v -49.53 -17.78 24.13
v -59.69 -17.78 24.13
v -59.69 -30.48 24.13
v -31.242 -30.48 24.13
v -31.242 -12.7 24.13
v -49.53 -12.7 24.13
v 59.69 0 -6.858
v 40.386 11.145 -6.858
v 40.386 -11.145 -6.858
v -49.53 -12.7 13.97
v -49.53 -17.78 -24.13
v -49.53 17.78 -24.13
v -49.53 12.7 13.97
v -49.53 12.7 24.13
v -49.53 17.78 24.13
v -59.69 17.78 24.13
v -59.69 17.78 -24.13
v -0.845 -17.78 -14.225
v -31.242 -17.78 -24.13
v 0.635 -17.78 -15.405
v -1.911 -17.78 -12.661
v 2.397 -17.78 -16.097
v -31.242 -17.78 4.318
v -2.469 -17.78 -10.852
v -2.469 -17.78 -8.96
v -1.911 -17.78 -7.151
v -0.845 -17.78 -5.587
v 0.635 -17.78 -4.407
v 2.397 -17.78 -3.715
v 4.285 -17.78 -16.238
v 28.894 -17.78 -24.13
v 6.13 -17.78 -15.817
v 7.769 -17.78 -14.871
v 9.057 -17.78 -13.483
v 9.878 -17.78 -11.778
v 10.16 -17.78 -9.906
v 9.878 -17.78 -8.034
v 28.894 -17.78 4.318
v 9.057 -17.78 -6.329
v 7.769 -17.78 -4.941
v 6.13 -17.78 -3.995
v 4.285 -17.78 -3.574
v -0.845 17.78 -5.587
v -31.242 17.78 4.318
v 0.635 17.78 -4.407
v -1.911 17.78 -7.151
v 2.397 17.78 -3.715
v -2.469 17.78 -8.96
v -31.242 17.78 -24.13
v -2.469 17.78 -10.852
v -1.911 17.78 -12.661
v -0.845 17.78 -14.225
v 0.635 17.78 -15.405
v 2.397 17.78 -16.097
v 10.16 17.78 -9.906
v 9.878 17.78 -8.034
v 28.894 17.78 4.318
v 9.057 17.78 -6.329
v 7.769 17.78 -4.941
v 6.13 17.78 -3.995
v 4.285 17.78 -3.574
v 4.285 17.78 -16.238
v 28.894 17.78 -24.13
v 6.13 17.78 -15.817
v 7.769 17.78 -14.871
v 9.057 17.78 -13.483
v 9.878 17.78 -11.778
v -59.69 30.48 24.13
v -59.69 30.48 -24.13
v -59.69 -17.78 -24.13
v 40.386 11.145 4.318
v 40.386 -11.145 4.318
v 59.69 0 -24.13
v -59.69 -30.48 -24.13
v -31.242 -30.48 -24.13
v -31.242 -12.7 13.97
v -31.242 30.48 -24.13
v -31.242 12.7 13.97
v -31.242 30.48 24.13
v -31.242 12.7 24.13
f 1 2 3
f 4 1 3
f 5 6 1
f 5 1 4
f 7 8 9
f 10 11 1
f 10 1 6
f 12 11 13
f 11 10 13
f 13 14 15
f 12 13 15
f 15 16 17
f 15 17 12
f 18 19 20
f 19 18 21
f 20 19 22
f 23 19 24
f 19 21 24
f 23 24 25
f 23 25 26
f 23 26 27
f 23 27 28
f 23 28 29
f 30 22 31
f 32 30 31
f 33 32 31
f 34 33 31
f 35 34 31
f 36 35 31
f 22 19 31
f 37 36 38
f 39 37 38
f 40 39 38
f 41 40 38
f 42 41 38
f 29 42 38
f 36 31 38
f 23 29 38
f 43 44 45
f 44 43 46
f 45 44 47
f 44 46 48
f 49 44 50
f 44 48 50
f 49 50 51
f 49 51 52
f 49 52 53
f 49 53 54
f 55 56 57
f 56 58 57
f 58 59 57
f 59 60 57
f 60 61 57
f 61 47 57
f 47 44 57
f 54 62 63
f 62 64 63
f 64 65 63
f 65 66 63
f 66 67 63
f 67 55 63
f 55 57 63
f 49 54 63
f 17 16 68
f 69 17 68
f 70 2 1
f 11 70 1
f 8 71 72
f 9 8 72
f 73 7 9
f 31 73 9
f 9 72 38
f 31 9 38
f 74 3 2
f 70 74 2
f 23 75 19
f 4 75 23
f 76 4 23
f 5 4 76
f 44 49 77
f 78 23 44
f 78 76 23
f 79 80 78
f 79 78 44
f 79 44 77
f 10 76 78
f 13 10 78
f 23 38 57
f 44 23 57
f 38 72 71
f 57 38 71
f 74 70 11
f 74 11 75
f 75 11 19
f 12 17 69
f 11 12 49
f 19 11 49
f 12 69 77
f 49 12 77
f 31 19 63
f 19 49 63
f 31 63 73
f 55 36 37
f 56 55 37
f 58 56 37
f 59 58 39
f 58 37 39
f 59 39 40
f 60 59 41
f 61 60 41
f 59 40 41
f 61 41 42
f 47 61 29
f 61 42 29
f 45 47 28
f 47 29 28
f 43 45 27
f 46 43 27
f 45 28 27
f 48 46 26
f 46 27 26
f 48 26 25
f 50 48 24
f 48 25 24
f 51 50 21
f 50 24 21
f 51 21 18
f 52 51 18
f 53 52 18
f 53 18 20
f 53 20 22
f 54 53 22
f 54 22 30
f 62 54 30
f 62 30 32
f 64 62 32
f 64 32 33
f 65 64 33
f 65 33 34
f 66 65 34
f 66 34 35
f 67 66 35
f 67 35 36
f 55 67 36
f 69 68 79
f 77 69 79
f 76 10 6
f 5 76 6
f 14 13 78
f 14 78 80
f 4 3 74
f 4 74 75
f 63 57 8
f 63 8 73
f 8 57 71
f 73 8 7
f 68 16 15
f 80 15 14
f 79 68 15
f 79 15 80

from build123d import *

# Parameters (mm, degrees)
F0_W      = 119.38
F0_H      = 60.96
F1_DEPTH  = 24.13
F3_DEPTH  = 90.932
F4_W      = 25.4
F4_H      = 10.16
F5_DEPTH  = 45.3898
F6_W      = 10.16
F6_H      = 35.56
F7_DEPTH  = 53.4162
F9_DEPTH  = 34.798
F11_DEPTH = 11.176
F12_R     = 6.35
F13_DEPTH = 58.166


with BuildPart() as f1:
    # F0 (on Top) → F1 (new body, symmetric)
    with BuildSketch(Plane.XY):
        Rectangle(F0_W, F0_H)
    extrude(amount=F1_DEPTH, both=True)

    # F2 (on face) → F3 (cut)
    with BuildSketch(Plane.YZ.offset(59.69)):
        Polygon((-30.48, -24.13), (-17.78, -24.13), (-17.78, 4.318), (17.78, 4.318), (17.78, -24.13), (30.48, -24.13), (30.48, 24.13), (-30.48, 24.13), align=None)
    extrude(amount=-F3_DEPTH, mode=Mode.SUBTRACT)

    # F4 (on face) → F5 (cut)
    with BuildSketch(Plane.YZ.offset(-31.242)):
        with Locations((0, 19.05)):
            Rectangle(F4_W, F4_H)
    extrude(amount=-F5_DEPTH, mode=Mode.SUBTRACT)

    # F6 (on face) → F7 (cut)
    with BuildSketch(Plane.XY.offset(24.13)):
        with Locations((-54.61, 0)):
            Rectangle(F6_W, F6_H)
    extrude(amount=-F7_DEPTH, mode=Mode.SUBTRACT)

    # F8 (on face) → F9 (cut)
    with BuildSketch(Plane.XY.offset(4.318)):
        Polygon((28.894137, 17.78), (59.69, 0), (59.69, 17.78), align=None)
        Polygon((59.69, -17.78), (59.69, 0), (28.894137, -17.78), align=None)
    extrude(amount=-F9_DEPTH, mode=Mode.SUBTRACT)

    # F10 (on face) → F11 (cut)
    with BuildSketch(Plane.XY.offset(4.318)):
        Polygon((40.386, 11.14517), (40.386, -11.14517), (59.69, 0), align=None)
    extrude(amount=-F11_DEPTH, mode=Mode.SUBTRACT)

    # F12 (on face) → F13 (cut)
    with BuildSketch(Plane.XZ.offset(17.78)):
        with Locations((3.81, -9.906)):
            Circle(F12_R)
    extrude(amount=-F13_DEPTH, mode=Mode.SUBTRACT)


solid = f1.part
